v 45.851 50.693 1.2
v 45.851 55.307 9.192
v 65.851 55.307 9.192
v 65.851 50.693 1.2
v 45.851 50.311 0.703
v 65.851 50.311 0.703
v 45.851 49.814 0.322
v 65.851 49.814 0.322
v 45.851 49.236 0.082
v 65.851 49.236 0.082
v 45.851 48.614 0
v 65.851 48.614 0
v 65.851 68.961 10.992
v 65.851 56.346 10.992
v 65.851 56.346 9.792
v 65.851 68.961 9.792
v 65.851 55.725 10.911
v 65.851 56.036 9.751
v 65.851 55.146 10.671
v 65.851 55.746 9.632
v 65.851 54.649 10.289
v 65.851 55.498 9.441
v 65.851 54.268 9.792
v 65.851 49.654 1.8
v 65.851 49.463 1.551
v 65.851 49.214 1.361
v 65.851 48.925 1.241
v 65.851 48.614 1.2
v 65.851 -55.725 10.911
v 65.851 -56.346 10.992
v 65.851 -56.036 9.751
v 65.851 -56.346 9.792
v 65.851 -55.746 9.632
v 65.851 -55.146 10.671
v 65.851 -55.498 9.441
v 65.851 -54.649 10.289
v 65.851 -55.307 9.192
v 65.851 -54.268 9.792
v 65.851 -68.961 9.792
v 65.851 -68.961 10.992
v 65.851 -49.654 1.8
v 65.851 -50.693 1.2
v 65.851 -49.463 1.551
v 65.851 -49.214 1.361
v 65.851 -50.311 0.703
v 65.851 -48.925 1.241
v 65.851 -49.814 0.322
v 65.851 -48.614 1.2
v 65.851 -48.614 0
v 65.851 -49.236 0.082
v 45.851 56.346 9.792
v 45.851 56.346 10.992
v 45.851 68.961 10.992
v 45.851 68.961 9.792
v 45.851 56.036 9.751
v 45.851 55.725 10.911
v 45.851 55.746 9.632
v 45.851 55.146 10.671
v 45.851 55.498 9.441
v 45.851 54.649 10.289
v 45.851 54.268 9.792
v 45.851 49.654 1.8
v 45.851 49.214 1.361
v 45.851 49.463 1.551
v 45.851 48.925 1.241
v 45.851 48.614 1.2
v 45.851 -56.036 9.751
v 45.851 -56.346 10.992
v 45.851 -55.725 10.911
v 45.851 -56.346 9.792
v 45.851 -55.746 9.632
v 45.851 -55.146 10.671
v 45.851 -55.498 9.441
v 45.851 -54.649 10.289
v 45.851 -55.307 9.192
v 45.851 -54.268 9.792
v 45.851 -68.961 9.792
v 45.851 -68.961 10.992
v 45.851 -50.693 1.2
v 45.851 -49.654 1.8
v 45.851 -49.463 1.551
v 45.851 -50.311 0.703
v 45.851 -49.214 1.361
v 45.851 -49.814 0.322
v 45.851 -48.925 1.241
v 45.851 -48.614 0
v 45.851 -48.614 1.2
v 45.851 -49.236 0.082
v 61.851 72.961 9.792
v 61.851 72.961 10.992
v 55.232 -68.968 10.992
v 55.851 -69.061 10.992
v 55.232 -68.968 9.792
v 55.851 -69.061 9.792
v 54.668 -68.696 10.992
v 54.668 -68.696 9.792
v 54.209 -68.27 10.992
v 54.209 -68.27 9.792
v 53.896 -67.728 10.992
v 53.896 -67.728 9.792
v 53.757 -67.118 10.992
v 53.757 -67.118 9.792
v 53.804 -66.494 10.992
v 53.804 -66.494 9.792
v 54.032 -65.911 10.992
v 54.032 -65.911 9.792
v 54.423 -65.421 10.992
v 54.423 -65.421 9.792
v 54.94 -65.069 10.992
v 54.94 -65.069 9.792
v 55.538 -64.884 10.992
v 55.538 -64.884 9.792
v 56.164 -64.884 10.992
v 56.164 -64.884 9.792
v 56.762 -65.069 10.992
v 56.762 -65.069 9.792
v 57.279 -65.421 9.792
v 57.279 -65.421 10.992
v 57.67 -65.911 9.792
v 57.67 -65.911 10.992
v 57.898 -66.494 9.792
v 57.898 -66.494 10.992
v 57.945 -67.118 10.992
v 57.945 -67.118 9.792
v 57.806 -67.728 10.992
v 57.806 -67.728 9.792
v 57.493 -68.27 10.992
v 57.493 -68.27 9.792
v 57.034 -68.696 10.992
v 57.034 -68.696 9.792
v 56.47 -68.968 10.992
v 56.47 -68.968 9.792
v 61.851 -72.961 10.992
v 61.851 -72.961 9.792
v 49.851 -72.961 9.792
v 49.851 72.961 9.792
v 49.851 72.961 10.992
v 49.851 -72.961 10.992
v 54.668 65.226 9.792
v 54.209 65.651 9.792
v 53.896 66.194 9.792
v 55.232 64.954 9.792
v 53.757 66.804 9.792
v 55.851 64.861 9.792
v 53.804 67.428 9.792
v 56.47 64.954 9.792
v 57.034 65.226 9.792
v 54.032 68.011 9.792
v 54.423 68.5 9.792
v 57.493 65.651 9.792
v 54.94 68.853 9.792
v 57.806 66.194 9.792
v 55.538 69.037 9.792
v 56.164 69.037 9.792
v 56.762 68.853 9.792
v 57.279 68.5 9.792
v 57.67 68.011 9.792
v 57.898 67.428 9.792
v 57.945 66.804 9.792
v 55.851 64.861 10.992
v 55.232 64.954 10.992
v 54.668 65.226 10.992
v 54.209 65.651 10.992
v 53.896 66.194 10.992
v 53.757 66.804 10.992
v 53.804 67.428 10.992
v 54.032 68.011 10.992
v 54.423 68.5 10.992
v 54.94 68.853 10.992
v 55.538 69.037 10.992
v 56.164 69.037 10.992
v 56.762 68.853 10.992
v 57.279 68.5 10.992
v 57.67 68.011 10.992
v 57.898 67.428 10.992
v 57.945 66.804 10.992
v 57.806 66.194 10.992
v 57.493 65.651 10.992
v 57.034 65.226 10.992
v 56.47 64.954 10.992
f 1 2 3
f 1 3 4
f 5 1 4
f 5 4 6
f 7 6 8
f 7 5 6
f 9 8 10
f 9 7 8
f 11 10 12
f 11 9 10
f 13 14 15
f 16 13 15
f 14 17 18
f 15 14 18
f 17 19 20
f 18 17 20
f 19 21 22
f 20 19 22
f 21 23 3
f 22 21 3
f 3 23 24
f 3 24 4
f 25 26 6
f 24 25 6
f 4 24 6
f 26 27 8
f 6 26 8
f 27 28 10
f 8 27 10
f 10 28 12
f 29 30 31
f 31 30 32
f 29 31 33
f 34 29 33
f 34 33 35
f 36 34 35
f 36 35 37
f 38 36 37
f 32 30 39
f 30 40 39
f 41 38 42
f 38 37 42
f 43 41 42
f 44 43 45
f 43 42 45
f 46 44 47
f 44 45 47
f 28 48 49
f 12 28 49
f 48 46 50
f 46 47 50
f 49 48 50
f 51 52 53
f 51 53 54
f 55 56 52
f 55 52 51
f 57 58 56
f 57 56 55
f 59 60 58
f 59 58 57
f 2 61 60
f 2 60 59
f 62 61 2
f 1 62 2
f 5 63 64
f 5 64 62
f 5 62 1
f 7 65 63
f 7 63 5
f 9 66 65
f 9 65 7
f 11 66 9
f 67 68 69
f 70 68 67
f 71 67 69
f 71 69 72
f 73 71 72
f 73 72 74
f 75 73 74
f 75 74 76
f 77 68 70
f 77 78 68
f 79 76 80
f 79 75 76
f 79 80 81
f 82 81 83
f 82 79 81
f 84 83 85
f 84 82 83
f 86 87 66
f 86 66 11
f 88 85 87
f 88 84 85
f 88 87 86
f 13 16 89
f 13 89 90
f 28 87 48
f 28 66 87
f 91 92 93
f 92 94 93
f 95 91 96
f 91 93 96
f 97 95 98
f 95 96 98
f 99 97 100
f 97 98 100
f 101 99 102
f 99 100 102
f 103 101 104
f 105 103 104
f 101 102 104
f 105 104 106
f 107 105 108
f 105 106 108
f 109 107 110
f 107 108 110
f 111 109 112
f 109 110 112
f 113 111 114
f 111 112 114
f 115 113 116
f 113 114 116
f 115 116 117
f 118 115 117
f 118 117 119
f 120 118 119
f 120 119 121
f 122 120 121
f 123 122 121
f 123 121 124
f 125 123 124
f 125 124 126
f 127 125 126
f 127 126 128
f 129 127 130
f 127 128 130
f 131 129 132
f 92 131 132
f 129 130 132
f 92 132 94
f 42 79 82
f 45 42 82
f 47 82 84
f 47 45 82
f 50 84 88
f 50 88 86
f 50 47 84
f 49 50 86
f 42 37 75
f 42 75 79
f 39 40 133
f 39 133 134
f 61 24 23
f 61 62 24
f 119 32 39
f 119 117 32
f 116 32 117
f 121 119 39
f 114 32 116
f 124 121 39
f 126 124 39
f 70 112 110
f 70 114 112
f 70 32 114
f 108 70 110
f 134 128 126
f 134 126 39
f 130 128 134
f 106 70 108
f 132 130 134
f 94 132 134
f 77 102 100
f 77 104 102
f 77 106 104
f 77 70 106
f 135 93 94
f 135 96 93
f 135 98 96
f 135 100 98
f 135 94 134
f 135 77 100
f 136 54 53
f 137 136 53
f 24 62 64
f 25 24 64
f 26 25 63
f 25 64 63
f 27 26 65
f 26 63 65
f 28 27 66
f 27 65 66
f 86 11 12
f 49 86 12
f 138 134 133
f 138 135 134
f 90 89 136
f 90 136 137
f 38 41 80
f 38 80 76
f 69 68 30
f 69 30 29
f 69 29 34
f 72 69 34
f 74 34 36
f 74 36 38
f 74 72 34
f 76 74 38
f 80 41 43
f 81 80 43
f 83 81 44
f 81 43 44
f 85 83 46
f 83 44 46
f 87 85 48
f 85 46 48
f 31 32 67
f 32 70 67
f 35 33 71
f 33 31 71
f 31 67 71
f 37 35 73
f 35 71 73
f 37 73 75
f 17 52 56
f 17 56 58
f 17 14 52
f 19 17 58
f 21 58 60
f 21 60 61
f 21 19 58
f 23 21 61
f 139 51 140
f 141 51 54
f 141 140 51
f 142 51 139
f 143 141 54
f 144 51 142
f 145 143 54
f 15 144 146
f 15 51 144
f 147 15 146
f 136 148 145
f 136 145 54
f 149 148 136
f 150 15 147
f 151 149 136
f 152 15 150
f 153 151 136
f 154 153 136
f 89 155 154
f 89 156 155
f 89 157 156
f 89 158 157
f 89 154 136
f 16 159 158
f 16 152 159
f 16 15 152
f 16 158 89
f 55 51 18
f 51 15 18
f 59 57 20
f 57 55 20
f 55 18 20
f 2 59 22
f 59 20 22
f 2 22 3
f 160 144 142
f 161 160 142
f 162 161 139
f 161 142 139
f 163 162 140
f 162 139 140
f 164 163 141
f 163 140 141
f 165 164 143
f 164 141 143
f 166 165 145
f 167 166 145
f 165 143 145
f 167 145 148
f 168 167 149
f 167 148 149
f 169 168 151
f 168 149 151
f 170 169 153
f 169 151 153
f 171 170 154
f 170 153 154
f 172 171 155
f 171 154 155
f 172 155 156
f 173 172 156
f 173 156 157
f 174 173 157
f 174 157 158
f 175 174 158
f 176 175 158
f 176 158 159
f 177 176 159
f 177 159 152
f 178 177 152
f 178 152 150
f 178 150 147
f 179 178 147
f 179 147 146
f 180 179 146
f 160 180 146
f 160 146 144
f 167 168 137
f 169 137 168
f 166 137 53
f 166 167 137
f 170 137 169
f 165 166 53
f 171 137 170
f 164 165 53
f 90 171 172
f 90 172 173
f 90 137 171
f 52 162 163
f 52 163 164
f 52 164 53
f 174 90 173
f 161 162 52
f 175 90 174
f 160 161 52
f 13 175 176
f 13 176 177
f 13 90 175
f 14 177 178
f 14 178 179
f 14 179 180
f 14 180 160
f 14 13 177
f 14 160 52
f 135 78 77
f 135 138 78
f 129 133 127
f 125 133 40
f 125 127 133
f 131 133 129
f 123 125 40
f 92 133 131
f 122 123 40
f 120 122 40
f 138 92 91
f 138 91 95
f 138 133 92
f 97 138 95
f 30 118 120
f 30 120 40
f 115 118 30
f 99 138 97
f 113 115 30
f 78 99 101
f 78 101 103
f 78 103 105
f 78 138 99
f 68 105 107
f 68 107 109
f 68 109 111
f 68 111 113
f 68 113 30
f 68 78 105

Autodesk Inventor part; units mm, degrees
ref_plane "YZ Plane" through (0, 0, 0) normal (1, 0, 0) x (0, 1, 0)
ref_plane "XZ Plane" through (0, 0, 0) normal (0, 1, 0) x (-1, 0, 0)
ref_plane "XY Plane" through (0, 0, 0) normal (0, 0, 1) x (1, 0, 0)
sketch "Sketch1" plane through (0, 0, 0) normal (0, 0, 1) x (1, 0, 0)
  line L0 (45.8511, 50) -> (65.8511, 50)
  line L1 (65.8511, 50) -> (65.8511, -50)
  line L2 (65.8511, -50) -> (45.8511, -50)
  line L3 (45.8511, -50) -> (45.8511, 50)
  line L4 (45.8511, 50) -> (65.8511, -50) construction
  line L5 (65.8511, 50) -> (45.8511, -50) construction
  line L6 (100.8511, 74.3) -> (100.8511, -74.3)
  point P0 (0, 0)
  point P1 (55.8511, 0)
  point P2 (55.8511, 0)
  dimension "d0" = 100
  dimension "d1" = 20
  dimension "d36" = 45
extrude "Plate1" add sketch "Sketch1" along normal blind 1.2
sketch "Sketch2" plane through (65.8511, -48.9608, 0.6) normal (0, -0.8660254, -0.5) x (1, 0, 0)
  line L0 (-20, 0) -> (0, 0)
  line L1 (0, 0) -> (0, 12)
  line L2 (0, 12) -> (-20, 12)
  line L3 (-20, 12) -> (-20, 0)
edge flange "Flange1" height 12 angle 60 thickness 1.2 bend radius 1.2 thickness toward (0, -0.8660254, -0.5) relief tear relief width 1.2 relief depth 0.6 corner gap 1.2 corner form 0 edges at (55.8511, -50, 1.2) (55.8511, 50, 1.2) wall of the first edge with corners at (45.8511, -48.9608, 0.6) (65.8511, -48.9608, 0.6) (65.8511, -54.9608, 10.9923) (45.8511, -54.9608, 10.9923)
bend "Bend1"
corner "Corner1"
sketch "Sketch3" plane through (45.8511, -54.9608, 9.7923) normal (0, 0, 1) x (1, 0, 0)
  line L0 (20, 0) -> (0, 0)
  line L1 (0, 0) -> (0, -18)
  line L2 (0, -18) -> (20, -18)
  line L3 (20, -18) -> (20, 0)
edge flange "Flange2" height 18 angle 60 thickness 1.2 bend radius 1.2 thickness toward (0, 0, 1) relief tear relief width 1.2 relief depth 0.6 corner gap 1.2 corner form 0 edges at (55.8511, -56, 10.3923) (55.8511, 56, 10.3923) wall of the first edge with corners at (65.8511, -54.9608, 9.7923) (45.8511, -54.9608, 9.7923) (45.8511, -72.9608, 9.7923) (65.8511, -72.9608, 9.7923)
bend "Bend2"
corner "Corner2"
chamfer "Corner Chamfer1" distance 4 angle 45 4 edges at (45.8511, -72.9608, 10.3923) (65.8511, -72.9608, 10.3923) (45.8511, 72.9608, 10.3923) (65.8511, 72.9608, 10.3923)
sketch "Sketch4" plane through (45.8511, -56.3464, 10.9923) normal (0, 0, 1) x (1, 0, 0)
  line L0 (4, 129.3072) -> (16, 129.3072) projected
  line L1 (16, -16.6144) -> (4, -16.6144) projected
  point P0 (-45.8511, 56.3464)
  point P1 (10, -10.6144)
  point P2 (10, 123.3072)
  point P3 (10, 129.3072)
  point P4 (10, -16.6144)
  dimension "d27" = 6
  dimension "d28" = 6
hole "Hole1" at (55.8511, -66.9608, 10.9923) at (55.8511, 66.9608, 10.9923) direction (0, 0, -1) diameter 4.2 depth 1.2 tip angle 118
equation "\"d34\" = Thickness"
equation "\"d4\" = BendReliefWidth"
equation "\"d5\" = BendReliefDepth"
equation "\"d6\" = MinimumRemnant"
equation "\"d7\" = BendRadius"
equation "\"d10\" = BendRadius"
equation "\"d11\" = CornerReliefSize"
equation "\"d12\" = GapSize"
equation "\"d13\" = JacobiRadiusSize"
equation "\"d14\" = BendReliefWidth"
equation "\"d15\" = BendReliefDepth"
equation "\"d16\" = MinimumRemnant"
equation "\"d17\" = BendRadius"
equation "\"d20\" = BendRadius"
equation "\"d21\" = CornerReliefSize"
equation "\"d22\" = GapSize"
equation "\"d23\" = JacobiRadiusSize"
equation "\"BendRadius\" = Thickness"
equation "\"BendReliefWidth\" = Thickness"
equation "\"BendReliefDepth\" = 0.5 * Thickness"
equation "\"CornerReliefSize\" = 4 * Thickness"
equation "\"MinimumRemnant\" = 2 * Thickness"
equation "\"TransitionRadius\" = BendRadius"
equation "\"JacobiRadiusSize\" = BendRadius"
equation "\"GapSize\" = Thickness"
equation "\"d3\" = BendRadius"
equation "\"Thickness\" = 1.2"
